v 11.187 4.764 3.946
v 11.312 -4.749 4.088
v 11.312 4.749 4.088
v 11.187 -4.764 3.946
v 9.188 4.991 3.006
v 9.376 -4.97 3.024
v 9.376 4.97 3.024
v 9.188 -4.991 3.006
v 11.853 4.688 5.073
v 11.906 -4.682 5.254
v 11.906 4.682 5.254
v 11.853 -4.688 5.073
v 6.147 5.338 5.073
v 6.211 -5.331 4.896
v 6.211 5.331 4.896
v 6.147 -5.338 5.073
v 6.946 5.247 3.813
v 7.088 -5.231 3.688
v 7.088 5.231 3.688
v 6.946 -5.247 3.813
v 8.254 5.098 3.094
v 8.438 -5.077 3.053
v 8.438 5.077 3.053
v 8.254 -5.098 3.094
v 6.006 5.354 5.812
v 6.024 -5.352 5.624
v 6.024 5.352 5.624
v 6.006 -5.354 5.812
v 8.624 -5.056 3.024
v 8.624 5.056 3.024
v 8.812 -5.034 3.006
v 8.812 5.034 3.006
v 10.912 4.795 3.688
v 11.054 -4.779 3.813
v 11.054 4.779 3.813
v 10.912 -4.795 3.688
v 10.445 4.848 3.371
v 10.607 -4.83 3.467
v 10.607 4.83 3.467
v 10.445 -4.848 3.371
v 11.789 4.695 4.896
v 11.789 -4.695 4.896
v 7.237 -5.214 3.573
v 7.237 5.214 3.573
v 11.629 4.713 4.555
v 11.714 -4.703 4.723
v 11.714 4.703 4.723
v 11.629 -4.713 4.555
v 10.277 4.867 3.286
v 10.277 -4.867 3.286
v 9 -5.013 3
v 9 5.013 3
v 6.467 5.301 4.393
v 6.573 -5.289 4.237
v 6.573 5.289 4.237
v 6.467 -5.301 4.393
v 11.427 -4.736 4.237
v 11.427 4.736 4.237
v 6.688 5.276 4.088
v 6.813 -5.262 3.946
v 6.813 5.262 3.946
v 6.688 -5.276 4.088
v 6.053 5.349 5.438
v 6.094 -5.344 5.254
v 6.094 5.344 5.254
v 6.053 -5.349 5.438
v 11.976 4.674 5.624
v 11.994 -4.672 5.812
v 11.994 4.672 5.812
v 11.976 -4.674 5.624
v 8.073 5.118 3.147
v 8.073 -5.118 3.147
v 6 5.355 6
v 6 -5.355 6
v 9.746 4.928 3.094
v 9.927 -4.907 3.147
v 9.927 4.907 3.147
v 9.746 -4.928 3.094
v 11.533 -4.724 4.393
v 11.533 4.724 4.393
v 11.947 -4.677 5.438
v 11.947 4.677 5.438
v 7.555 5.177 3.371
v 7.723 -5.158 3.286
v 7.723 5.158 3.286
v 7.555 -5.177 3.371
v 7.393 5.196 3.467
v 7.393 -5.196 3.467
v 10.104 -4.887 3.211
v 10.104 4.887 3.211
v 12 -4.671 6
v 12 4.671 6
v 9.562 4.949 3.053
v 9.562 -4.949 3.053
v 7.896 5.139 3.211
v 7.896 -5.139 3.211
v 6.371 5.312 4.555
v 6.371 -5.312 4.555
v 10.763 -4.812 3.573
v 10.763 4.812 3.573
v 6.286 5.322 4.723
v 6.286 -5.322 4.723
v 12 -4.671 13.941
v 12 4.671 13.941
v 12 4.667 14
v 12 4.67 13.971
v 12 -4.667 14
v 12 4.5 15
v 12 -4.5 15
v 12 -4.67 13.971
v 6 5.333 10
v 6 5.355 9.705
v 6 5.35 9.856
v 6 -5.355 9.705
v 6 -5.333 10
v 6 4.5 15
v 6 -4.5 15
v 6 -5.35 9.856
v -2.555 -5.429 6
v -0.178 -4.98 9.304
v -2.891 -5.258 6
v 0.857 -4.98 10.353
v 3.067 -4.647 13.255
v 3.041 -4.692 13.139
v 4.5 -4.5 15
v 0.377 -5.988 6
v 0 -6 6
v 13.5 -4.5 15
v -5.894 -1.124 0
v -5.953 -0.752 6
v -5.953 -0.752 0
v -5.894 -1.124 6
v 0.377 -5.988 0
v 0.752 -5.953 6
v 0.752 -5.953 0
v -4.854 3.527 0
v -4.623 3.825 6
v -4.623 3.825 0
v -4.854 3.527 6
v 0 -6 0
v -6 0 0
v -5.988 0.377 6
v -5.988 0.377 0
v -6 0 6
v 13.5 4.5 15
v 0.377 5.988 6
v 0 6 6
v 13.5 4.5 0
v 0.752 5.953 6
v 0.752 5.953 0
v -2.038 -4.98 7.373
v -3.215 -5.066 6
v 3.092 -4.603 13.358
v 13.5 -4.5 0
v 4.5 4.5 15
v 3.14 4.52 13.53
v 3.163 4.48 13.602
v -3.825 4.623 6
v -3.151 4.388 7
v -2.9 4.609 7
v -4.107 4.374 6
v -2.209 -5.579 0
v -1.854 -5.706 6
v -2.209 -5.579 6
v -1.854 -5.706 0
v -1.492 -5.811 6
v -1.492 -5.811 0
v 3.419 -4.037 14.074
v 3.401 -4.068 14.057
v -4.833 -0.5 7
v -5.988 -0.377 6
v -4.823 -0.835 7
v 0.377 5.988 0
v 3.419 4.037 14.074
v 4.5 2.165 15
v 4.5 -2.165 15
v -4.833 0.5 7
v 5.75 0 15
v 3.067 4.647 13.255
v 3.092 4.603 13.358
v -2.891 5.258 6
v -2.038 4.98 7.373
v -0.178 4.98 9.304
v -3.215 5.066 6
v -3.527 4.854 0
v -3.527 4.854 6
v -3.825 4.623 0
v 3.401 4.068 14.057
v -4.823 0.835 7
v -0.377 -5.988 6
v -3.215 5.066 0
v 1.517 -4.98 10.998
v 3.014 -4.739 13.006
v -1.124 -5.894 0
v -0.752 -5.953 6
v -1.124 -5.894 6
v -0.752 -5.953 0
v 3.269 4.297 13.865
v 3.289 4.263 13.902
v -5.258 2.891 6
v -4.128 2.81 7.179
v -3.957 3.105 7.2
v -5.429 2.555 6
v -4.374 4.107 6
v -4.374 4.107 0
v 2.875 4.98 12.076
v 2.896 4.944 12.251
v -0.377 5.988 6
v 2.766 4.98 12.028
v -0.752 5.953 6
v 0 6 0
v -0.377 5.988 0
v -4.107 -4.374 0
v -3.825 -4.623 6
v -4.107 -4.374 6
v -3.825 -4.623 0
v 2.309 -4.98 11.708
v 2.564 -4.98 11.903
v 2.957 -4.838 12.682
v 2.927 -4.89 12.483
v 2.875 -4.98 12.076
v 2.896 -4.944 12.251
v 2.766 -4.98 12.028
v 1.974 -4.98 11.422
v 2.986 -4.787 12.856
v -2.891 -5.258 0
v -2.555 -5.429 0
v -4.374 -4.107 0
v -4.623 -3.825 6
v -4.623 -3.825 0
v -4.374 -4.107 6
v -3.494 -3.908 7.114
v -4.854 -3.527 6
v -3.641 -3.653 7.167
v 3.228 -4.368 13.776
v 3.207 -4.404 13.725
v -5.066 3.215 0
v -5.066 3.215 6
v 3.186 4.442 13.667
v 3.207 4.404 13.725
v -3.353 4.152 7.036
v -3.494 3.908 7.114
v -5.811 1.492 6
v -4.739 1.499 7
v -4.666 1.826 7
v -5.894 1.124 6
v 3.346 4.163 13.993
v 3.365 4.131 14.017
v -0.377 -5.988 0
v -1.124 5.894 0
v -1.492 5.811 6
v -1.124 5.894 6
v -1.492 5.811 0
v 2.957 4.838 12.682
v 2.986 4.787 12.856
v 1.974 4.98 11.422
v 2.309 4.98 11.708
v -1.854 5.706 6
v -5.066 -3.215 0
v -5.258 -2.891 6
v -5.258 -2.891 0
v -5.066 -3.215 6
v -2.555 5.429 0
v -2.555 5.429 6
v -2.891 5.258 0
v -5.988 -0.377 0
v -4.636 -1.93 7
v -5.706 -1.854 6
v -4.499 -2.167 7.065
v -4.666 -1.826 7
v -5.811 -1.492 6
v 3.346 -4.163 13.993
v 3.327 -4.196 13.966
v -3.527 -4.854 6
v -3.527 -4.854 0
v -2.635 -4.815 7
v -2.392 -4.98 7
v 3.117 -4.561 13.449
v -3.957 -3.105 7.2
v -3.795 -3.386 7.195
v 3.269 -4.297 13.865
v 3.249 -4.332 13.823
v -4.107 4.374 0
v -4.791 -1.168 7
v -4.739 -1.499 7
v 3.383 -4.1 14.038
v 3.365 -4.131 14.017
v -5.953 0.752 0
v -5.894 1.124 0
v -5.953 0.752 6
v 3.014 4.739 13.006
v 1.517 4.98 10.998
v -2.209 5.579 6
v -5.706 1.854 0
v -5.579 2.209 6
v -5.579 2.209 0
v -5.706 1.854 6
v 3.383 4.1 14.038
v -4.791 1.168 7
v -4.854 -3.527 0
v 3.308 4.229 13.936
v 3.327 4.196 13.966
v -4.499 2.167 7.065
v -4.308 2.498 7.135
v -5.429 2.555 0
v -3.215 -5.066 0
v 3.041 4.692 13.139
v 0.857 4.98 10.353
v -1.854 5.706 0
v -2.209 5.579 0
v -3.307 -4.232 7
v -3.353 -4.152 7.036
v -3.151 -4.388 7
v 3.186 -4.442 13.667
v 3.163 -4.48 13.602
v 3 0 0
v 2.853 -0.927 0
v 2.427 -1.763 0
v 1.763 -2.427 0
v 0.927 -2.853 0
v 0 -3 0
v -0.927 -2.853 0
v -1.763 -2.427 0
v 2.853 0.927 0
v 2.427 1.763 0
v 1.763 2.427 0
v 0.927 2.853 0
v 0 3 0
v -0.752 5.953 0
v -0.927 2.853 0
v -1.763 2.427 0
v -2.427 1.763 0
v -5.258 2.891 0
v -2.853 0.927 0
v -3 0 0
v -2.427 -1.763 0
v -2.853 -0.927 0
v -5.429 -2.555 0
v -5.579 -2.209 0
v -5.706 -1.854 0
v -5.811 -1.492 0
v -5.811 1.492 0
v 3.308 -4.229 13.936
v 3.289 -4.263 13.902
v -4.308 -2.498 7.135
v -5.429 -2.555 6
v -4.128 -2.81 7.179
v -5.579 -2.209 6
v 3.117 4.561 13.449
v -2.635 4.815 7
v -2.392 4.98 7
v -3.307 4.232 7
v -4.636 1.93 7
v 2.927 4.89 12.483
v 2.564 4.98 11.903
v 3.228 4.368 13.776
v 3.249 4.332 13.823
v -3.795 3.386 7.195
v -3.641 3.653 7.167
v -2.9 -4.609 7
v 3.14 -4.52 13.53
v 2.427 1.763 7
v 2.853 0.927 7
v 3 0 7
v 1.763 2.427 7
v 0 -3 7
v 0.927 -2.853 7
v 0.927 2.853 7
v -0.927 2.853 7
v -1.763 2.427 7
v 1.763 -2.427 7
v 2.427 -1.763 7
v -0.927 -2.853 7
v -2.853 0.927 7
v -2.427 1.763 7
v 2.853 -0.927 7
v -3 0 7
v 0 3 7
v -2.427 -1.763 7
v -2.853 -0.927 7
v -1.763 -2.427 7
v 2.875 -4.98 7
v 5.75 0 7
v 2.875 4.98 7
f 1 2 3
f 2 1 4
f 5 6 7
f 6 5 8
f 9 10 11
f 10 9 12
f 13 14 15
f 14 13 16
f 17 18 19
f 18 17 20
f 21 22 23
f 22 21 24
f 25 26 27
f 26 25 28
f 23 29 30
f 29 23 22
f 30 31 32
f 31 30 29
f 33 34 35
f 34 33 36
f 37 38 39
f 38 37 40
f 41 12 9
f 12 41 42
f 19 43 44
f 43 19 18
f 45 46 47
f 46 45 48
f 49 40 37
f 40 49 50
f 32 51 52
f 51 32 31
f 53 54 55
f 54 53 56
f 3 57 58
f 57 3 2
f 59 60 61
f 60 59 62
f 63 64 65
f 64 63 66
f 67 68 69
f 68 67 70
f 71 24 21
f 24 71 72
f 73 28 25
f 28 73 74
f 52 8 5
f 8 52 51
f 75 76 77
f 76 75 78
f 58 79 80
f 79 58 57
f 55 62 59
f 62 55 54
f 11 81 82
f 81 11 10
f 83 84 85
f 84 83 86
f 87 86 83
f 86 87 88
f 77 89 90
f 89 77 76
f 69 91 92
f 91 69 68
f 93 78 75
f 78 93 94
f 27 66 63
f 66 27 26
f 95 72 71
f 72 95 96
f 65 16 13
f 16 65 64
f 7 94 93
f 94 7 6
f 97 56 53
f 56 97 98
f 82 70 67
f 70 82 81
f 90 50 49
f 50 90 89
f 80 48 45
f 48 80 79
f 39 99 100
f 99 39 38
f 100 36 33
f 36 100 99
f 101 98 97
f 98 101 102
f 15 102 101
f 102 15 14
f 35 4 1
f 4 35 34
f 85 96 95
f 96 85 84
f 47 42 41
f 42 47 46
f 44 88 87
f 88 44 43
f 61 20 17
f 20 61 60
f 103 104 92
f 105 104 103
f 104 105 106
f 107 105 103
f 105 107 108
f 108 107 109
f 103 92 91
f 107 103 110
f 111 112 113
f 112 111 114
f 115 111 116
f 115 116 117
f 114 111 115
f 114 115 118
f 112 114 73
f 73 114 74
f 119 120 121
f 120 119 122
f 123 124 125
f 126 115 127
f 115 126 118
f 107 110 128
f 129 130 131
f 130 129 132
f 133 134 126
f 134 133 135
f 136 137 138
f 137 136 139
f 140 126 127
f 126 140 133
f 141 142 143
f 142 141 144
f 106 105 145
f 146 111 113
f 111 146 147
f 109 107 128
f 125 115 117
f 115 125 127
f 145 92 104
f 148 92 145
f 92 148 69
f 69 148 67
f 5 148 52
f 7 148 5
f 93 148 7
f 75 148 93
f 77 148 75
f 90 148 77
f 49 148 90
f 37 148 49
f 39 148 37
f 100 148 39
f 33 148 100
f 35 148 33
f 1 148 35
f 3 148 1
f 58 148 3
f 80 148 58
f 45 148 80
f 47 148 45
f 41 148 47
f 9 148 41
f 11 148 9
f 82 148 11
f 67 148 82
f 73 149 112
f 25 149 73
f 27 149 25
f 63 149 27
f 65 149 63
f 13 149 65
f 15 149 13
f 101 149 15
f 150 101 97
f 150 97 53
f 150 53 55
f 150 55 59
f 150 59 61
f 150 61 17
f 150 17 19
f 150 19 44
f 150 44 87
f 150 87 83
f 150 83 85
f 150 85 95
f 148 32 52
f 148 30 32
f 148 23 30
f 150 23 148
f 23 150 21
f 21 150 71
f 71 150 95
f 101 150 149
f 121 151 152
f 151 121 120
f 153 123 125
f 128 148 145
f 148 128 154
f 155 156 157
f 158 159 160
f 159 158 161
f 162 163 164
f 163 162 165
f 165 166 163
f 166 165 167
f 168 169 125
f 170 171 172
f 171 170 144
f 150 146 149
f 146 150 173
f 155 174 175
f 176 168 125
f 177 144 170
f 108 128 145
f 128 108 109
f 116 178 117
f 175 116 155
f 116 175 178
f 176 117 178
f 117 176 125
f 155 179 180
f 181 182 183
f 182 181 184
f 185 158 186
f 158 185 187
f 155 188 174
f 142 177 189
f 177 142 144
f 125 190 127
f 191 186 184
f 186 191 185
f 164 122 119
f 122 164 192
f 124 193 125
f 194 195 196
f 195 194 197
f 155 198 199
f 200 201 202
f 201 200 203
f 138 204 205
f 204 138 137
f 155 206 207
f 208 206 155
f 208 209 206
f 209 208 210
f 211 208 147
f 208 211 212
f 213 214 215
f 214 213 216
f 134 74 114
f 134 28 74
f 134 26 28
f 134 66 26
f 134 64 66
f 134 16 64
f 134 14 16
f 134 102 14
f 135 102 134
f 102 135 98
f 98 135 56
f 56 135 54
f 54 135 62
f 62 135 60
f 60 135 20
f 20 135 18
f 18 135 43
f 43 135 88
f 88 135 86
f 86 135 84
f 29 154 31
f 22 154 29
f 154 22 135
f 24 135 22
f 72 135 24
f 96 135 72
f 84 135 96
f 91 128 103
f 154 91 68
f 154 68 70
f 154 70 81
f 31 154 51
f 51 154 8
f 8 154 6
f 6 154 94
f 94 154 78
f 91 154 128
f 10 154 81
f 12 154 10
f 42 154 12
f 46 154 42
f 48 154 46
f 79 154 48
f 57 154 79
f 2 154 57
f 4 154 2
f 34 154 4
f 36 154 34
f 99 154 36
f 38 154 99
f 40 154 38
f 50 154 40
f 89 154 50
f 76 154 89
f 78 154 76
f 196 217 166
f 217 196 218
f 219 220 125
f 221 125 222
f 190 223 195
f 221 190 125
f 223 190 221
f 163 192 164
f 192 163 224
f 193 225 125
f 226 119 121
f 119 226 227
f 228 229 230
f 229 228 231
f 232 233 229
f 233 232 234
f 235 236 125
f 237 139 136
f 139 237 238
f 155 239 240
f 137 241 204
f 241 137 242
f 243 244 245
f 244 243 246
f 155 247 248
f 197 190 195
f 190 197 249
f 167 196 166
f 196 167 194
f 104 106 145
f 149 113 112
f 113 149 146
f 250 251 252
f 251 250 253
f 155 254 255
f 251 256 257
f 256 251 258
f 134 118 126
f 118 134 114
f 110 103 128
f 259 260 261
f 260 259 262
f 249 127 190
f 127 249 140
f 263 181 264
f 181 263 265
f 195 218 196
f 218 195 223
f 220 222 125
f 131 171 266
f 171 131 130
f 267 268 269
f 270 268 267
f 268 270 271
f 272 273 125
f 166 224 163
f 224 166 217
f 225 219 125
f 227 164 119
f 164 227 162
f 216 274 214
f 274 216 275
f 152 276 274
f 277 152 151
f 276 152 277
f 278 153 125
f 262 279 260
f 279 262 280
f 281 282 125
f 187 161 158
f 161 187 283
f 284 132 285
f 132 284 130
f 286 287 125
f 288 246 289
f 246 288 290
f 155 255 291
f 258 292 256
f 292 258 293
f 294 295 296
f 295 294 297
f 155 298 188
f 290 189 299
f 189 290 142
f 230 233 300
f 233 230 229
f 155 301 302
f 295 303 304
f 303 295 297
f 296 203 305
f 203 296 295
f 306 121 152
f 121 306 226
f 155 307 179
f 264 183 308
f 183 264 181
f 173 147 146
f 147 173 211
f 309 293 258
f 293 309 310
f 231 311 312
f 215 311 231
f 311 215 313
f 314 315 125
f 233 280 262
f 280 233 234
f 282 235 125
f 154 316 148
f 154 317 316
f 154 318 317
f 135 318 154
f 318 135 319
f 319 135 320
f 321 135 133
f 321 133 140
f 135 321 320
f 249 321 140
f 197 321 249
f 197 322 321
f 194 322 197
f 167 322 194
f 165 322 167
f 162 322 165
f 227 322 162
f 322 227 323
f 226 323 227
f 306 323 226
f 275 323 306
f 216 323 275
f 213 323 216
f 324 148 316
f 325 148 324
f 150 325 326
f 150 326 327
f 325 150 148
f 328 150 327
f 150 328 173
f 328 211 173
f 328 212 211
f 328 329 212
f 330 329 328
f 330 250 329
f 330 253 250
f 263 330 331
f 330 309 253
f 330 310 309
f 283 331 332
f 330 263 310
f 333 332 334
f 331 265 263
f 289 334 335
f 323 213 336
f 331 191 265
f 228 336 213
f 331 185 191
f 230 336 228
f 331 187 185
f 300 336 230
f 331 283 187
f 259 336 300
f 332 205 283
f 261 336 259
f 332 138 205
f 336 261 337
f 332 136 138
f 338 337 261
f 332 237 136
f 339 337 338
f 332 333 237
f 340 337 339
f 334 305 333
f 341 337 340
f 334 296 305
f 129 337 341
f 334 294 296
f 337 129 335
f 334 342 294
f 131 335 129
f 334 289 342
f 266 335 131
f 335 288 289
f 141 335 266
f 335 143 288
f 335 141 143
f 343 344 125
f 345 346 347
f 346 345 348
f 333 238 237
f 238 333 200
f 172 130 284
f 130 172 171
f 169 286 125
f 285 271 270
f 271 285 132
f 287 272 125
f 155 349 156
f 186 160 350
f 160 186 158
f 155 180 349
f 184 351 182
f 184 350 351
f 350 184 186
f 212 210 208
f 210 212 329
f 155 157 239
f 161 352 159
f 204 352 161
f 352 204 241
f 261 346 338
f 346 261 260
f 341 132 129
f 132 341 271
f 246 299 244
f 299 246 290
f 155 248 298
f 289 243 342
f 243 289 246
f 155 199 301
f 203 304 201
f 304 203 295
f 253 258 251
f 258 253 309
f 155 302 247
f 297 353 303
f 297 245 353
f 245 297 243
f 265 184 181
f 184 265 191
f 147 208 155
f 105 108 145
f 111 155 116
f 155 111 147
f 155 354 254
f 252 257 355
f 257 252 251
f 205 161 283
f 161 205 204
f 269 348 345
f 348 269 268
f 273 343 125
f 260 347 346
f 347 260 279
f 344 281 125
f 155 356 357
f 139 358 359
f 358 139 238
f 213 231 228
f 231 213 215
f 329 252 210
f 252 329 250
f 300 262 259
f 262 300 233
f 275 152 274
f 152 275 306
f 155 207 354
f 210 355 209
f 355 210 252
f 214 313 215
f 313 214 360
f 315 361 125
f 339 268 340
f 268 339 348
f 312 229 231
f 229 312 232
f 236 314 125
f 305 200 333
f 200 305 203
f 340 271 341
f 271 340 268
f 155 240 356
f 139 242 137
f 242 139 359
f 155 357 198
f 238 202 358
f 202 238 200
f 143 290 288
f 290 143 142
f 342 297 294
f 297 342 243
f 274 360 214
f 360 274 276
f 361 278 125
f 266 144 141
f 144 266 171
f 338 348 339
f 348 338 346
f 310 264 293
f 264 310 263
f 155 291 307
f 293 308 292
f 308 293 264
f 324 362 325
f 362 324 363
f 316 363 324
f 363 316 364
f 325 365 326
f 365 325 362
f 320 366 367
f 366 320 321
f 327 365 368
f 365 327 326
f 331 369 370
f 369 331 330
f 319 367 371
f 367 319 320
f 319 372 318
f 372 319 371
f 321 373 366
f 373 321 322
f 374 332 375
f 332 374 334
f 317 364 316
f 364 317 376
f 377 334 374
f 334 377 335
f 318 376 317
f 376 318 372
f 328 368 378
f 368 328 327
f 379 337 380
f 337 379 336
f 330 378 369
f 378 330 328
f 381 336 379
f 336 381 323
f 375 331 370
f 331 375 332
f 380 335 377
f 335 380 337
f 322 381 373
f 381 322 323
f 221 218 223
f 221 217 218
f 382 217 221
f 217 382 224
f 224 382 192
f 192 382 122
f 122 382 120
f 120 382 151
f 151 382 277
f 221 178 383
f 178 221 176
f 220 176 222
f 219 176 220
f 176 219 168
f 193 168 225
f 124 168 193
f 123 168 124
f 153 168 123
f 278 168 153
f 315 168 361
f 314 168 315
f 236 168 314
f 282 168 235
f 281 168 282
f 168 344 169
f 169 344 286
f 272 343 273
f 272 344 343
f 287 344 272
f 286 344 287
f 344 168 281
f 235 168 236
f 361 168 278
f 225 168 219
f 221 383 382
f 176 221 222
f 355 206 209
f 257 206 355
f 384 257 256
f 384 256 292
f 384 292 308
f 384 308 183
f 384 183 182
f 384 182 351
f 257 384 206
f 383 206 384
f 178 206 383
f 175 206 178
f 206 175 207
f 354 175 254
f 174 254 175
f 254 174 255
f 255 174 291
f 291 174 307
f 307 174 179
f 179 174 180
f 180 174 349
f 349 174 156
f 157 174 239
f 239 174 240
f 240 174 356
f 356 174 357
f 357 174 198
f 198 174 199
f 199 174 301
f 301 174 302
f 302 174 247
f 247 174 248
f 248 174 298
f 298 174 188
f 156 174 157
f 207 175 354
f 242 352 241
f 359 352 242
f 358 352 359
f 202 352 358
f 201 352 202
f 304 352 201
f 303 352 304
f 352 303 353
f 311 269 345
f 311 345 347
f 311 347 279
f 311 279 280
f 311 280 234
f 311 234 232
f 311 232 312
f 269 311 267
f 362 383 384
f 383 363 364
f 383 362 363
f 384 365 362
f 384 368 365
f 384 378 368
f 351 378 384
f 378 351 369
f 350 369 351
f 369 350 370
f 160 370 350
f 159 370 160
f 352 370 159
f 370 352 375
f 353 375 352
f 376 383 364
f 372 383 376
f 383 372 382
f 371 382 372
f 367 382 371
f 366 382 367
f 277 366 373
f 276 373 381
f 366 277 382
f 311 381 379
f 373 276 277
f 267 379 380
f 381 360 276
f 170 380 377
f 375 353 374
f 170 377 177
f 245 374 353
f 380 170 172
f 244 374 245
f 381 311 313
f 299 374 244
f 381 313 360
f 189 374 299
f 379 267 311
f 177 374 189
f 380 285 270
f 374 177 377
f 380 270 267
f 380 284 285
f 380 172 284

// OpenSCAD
// Loose Bar clamp
// Used for loose joining two rods
// GNU GPL v3
// Maciej Urbański
// rooter@kyberian.net

inf=9999;
$fn = 100;

module loose_barclamp(rod_a_d, rod_b_d, width=2, h=20){

    difference(){
        hull(){
            cylinder(h = width+rod_b_d/2, r=rod_a_d/2+width);
            translate([(rod_b_d+width)/2, -(rod_b_d+width)/2, 0]) 
                cube([rod_b_d+width, rod_b_d+width, h]);

        }

        cylinder(h = inf, d=rod_a_d, $fn = 20);
        translate([rod_b_d+width, 0, rod_b_d/2+width]) 
            union() {
                translate([0, inf/2, 0]) rotate([90, 0, 0]) cylinder(d=rod_b_d, h=inf);
                translate([-rod_b_d/2,-inf/2,0]) cube([rod_b_d, inf, inf]);
            }

    }
}


difference(){
    loose_barclamp(6, 6, 3, 15);
    translate([0,0,7]) cylinder(h=10, d=11.5, $fn=6);
}
